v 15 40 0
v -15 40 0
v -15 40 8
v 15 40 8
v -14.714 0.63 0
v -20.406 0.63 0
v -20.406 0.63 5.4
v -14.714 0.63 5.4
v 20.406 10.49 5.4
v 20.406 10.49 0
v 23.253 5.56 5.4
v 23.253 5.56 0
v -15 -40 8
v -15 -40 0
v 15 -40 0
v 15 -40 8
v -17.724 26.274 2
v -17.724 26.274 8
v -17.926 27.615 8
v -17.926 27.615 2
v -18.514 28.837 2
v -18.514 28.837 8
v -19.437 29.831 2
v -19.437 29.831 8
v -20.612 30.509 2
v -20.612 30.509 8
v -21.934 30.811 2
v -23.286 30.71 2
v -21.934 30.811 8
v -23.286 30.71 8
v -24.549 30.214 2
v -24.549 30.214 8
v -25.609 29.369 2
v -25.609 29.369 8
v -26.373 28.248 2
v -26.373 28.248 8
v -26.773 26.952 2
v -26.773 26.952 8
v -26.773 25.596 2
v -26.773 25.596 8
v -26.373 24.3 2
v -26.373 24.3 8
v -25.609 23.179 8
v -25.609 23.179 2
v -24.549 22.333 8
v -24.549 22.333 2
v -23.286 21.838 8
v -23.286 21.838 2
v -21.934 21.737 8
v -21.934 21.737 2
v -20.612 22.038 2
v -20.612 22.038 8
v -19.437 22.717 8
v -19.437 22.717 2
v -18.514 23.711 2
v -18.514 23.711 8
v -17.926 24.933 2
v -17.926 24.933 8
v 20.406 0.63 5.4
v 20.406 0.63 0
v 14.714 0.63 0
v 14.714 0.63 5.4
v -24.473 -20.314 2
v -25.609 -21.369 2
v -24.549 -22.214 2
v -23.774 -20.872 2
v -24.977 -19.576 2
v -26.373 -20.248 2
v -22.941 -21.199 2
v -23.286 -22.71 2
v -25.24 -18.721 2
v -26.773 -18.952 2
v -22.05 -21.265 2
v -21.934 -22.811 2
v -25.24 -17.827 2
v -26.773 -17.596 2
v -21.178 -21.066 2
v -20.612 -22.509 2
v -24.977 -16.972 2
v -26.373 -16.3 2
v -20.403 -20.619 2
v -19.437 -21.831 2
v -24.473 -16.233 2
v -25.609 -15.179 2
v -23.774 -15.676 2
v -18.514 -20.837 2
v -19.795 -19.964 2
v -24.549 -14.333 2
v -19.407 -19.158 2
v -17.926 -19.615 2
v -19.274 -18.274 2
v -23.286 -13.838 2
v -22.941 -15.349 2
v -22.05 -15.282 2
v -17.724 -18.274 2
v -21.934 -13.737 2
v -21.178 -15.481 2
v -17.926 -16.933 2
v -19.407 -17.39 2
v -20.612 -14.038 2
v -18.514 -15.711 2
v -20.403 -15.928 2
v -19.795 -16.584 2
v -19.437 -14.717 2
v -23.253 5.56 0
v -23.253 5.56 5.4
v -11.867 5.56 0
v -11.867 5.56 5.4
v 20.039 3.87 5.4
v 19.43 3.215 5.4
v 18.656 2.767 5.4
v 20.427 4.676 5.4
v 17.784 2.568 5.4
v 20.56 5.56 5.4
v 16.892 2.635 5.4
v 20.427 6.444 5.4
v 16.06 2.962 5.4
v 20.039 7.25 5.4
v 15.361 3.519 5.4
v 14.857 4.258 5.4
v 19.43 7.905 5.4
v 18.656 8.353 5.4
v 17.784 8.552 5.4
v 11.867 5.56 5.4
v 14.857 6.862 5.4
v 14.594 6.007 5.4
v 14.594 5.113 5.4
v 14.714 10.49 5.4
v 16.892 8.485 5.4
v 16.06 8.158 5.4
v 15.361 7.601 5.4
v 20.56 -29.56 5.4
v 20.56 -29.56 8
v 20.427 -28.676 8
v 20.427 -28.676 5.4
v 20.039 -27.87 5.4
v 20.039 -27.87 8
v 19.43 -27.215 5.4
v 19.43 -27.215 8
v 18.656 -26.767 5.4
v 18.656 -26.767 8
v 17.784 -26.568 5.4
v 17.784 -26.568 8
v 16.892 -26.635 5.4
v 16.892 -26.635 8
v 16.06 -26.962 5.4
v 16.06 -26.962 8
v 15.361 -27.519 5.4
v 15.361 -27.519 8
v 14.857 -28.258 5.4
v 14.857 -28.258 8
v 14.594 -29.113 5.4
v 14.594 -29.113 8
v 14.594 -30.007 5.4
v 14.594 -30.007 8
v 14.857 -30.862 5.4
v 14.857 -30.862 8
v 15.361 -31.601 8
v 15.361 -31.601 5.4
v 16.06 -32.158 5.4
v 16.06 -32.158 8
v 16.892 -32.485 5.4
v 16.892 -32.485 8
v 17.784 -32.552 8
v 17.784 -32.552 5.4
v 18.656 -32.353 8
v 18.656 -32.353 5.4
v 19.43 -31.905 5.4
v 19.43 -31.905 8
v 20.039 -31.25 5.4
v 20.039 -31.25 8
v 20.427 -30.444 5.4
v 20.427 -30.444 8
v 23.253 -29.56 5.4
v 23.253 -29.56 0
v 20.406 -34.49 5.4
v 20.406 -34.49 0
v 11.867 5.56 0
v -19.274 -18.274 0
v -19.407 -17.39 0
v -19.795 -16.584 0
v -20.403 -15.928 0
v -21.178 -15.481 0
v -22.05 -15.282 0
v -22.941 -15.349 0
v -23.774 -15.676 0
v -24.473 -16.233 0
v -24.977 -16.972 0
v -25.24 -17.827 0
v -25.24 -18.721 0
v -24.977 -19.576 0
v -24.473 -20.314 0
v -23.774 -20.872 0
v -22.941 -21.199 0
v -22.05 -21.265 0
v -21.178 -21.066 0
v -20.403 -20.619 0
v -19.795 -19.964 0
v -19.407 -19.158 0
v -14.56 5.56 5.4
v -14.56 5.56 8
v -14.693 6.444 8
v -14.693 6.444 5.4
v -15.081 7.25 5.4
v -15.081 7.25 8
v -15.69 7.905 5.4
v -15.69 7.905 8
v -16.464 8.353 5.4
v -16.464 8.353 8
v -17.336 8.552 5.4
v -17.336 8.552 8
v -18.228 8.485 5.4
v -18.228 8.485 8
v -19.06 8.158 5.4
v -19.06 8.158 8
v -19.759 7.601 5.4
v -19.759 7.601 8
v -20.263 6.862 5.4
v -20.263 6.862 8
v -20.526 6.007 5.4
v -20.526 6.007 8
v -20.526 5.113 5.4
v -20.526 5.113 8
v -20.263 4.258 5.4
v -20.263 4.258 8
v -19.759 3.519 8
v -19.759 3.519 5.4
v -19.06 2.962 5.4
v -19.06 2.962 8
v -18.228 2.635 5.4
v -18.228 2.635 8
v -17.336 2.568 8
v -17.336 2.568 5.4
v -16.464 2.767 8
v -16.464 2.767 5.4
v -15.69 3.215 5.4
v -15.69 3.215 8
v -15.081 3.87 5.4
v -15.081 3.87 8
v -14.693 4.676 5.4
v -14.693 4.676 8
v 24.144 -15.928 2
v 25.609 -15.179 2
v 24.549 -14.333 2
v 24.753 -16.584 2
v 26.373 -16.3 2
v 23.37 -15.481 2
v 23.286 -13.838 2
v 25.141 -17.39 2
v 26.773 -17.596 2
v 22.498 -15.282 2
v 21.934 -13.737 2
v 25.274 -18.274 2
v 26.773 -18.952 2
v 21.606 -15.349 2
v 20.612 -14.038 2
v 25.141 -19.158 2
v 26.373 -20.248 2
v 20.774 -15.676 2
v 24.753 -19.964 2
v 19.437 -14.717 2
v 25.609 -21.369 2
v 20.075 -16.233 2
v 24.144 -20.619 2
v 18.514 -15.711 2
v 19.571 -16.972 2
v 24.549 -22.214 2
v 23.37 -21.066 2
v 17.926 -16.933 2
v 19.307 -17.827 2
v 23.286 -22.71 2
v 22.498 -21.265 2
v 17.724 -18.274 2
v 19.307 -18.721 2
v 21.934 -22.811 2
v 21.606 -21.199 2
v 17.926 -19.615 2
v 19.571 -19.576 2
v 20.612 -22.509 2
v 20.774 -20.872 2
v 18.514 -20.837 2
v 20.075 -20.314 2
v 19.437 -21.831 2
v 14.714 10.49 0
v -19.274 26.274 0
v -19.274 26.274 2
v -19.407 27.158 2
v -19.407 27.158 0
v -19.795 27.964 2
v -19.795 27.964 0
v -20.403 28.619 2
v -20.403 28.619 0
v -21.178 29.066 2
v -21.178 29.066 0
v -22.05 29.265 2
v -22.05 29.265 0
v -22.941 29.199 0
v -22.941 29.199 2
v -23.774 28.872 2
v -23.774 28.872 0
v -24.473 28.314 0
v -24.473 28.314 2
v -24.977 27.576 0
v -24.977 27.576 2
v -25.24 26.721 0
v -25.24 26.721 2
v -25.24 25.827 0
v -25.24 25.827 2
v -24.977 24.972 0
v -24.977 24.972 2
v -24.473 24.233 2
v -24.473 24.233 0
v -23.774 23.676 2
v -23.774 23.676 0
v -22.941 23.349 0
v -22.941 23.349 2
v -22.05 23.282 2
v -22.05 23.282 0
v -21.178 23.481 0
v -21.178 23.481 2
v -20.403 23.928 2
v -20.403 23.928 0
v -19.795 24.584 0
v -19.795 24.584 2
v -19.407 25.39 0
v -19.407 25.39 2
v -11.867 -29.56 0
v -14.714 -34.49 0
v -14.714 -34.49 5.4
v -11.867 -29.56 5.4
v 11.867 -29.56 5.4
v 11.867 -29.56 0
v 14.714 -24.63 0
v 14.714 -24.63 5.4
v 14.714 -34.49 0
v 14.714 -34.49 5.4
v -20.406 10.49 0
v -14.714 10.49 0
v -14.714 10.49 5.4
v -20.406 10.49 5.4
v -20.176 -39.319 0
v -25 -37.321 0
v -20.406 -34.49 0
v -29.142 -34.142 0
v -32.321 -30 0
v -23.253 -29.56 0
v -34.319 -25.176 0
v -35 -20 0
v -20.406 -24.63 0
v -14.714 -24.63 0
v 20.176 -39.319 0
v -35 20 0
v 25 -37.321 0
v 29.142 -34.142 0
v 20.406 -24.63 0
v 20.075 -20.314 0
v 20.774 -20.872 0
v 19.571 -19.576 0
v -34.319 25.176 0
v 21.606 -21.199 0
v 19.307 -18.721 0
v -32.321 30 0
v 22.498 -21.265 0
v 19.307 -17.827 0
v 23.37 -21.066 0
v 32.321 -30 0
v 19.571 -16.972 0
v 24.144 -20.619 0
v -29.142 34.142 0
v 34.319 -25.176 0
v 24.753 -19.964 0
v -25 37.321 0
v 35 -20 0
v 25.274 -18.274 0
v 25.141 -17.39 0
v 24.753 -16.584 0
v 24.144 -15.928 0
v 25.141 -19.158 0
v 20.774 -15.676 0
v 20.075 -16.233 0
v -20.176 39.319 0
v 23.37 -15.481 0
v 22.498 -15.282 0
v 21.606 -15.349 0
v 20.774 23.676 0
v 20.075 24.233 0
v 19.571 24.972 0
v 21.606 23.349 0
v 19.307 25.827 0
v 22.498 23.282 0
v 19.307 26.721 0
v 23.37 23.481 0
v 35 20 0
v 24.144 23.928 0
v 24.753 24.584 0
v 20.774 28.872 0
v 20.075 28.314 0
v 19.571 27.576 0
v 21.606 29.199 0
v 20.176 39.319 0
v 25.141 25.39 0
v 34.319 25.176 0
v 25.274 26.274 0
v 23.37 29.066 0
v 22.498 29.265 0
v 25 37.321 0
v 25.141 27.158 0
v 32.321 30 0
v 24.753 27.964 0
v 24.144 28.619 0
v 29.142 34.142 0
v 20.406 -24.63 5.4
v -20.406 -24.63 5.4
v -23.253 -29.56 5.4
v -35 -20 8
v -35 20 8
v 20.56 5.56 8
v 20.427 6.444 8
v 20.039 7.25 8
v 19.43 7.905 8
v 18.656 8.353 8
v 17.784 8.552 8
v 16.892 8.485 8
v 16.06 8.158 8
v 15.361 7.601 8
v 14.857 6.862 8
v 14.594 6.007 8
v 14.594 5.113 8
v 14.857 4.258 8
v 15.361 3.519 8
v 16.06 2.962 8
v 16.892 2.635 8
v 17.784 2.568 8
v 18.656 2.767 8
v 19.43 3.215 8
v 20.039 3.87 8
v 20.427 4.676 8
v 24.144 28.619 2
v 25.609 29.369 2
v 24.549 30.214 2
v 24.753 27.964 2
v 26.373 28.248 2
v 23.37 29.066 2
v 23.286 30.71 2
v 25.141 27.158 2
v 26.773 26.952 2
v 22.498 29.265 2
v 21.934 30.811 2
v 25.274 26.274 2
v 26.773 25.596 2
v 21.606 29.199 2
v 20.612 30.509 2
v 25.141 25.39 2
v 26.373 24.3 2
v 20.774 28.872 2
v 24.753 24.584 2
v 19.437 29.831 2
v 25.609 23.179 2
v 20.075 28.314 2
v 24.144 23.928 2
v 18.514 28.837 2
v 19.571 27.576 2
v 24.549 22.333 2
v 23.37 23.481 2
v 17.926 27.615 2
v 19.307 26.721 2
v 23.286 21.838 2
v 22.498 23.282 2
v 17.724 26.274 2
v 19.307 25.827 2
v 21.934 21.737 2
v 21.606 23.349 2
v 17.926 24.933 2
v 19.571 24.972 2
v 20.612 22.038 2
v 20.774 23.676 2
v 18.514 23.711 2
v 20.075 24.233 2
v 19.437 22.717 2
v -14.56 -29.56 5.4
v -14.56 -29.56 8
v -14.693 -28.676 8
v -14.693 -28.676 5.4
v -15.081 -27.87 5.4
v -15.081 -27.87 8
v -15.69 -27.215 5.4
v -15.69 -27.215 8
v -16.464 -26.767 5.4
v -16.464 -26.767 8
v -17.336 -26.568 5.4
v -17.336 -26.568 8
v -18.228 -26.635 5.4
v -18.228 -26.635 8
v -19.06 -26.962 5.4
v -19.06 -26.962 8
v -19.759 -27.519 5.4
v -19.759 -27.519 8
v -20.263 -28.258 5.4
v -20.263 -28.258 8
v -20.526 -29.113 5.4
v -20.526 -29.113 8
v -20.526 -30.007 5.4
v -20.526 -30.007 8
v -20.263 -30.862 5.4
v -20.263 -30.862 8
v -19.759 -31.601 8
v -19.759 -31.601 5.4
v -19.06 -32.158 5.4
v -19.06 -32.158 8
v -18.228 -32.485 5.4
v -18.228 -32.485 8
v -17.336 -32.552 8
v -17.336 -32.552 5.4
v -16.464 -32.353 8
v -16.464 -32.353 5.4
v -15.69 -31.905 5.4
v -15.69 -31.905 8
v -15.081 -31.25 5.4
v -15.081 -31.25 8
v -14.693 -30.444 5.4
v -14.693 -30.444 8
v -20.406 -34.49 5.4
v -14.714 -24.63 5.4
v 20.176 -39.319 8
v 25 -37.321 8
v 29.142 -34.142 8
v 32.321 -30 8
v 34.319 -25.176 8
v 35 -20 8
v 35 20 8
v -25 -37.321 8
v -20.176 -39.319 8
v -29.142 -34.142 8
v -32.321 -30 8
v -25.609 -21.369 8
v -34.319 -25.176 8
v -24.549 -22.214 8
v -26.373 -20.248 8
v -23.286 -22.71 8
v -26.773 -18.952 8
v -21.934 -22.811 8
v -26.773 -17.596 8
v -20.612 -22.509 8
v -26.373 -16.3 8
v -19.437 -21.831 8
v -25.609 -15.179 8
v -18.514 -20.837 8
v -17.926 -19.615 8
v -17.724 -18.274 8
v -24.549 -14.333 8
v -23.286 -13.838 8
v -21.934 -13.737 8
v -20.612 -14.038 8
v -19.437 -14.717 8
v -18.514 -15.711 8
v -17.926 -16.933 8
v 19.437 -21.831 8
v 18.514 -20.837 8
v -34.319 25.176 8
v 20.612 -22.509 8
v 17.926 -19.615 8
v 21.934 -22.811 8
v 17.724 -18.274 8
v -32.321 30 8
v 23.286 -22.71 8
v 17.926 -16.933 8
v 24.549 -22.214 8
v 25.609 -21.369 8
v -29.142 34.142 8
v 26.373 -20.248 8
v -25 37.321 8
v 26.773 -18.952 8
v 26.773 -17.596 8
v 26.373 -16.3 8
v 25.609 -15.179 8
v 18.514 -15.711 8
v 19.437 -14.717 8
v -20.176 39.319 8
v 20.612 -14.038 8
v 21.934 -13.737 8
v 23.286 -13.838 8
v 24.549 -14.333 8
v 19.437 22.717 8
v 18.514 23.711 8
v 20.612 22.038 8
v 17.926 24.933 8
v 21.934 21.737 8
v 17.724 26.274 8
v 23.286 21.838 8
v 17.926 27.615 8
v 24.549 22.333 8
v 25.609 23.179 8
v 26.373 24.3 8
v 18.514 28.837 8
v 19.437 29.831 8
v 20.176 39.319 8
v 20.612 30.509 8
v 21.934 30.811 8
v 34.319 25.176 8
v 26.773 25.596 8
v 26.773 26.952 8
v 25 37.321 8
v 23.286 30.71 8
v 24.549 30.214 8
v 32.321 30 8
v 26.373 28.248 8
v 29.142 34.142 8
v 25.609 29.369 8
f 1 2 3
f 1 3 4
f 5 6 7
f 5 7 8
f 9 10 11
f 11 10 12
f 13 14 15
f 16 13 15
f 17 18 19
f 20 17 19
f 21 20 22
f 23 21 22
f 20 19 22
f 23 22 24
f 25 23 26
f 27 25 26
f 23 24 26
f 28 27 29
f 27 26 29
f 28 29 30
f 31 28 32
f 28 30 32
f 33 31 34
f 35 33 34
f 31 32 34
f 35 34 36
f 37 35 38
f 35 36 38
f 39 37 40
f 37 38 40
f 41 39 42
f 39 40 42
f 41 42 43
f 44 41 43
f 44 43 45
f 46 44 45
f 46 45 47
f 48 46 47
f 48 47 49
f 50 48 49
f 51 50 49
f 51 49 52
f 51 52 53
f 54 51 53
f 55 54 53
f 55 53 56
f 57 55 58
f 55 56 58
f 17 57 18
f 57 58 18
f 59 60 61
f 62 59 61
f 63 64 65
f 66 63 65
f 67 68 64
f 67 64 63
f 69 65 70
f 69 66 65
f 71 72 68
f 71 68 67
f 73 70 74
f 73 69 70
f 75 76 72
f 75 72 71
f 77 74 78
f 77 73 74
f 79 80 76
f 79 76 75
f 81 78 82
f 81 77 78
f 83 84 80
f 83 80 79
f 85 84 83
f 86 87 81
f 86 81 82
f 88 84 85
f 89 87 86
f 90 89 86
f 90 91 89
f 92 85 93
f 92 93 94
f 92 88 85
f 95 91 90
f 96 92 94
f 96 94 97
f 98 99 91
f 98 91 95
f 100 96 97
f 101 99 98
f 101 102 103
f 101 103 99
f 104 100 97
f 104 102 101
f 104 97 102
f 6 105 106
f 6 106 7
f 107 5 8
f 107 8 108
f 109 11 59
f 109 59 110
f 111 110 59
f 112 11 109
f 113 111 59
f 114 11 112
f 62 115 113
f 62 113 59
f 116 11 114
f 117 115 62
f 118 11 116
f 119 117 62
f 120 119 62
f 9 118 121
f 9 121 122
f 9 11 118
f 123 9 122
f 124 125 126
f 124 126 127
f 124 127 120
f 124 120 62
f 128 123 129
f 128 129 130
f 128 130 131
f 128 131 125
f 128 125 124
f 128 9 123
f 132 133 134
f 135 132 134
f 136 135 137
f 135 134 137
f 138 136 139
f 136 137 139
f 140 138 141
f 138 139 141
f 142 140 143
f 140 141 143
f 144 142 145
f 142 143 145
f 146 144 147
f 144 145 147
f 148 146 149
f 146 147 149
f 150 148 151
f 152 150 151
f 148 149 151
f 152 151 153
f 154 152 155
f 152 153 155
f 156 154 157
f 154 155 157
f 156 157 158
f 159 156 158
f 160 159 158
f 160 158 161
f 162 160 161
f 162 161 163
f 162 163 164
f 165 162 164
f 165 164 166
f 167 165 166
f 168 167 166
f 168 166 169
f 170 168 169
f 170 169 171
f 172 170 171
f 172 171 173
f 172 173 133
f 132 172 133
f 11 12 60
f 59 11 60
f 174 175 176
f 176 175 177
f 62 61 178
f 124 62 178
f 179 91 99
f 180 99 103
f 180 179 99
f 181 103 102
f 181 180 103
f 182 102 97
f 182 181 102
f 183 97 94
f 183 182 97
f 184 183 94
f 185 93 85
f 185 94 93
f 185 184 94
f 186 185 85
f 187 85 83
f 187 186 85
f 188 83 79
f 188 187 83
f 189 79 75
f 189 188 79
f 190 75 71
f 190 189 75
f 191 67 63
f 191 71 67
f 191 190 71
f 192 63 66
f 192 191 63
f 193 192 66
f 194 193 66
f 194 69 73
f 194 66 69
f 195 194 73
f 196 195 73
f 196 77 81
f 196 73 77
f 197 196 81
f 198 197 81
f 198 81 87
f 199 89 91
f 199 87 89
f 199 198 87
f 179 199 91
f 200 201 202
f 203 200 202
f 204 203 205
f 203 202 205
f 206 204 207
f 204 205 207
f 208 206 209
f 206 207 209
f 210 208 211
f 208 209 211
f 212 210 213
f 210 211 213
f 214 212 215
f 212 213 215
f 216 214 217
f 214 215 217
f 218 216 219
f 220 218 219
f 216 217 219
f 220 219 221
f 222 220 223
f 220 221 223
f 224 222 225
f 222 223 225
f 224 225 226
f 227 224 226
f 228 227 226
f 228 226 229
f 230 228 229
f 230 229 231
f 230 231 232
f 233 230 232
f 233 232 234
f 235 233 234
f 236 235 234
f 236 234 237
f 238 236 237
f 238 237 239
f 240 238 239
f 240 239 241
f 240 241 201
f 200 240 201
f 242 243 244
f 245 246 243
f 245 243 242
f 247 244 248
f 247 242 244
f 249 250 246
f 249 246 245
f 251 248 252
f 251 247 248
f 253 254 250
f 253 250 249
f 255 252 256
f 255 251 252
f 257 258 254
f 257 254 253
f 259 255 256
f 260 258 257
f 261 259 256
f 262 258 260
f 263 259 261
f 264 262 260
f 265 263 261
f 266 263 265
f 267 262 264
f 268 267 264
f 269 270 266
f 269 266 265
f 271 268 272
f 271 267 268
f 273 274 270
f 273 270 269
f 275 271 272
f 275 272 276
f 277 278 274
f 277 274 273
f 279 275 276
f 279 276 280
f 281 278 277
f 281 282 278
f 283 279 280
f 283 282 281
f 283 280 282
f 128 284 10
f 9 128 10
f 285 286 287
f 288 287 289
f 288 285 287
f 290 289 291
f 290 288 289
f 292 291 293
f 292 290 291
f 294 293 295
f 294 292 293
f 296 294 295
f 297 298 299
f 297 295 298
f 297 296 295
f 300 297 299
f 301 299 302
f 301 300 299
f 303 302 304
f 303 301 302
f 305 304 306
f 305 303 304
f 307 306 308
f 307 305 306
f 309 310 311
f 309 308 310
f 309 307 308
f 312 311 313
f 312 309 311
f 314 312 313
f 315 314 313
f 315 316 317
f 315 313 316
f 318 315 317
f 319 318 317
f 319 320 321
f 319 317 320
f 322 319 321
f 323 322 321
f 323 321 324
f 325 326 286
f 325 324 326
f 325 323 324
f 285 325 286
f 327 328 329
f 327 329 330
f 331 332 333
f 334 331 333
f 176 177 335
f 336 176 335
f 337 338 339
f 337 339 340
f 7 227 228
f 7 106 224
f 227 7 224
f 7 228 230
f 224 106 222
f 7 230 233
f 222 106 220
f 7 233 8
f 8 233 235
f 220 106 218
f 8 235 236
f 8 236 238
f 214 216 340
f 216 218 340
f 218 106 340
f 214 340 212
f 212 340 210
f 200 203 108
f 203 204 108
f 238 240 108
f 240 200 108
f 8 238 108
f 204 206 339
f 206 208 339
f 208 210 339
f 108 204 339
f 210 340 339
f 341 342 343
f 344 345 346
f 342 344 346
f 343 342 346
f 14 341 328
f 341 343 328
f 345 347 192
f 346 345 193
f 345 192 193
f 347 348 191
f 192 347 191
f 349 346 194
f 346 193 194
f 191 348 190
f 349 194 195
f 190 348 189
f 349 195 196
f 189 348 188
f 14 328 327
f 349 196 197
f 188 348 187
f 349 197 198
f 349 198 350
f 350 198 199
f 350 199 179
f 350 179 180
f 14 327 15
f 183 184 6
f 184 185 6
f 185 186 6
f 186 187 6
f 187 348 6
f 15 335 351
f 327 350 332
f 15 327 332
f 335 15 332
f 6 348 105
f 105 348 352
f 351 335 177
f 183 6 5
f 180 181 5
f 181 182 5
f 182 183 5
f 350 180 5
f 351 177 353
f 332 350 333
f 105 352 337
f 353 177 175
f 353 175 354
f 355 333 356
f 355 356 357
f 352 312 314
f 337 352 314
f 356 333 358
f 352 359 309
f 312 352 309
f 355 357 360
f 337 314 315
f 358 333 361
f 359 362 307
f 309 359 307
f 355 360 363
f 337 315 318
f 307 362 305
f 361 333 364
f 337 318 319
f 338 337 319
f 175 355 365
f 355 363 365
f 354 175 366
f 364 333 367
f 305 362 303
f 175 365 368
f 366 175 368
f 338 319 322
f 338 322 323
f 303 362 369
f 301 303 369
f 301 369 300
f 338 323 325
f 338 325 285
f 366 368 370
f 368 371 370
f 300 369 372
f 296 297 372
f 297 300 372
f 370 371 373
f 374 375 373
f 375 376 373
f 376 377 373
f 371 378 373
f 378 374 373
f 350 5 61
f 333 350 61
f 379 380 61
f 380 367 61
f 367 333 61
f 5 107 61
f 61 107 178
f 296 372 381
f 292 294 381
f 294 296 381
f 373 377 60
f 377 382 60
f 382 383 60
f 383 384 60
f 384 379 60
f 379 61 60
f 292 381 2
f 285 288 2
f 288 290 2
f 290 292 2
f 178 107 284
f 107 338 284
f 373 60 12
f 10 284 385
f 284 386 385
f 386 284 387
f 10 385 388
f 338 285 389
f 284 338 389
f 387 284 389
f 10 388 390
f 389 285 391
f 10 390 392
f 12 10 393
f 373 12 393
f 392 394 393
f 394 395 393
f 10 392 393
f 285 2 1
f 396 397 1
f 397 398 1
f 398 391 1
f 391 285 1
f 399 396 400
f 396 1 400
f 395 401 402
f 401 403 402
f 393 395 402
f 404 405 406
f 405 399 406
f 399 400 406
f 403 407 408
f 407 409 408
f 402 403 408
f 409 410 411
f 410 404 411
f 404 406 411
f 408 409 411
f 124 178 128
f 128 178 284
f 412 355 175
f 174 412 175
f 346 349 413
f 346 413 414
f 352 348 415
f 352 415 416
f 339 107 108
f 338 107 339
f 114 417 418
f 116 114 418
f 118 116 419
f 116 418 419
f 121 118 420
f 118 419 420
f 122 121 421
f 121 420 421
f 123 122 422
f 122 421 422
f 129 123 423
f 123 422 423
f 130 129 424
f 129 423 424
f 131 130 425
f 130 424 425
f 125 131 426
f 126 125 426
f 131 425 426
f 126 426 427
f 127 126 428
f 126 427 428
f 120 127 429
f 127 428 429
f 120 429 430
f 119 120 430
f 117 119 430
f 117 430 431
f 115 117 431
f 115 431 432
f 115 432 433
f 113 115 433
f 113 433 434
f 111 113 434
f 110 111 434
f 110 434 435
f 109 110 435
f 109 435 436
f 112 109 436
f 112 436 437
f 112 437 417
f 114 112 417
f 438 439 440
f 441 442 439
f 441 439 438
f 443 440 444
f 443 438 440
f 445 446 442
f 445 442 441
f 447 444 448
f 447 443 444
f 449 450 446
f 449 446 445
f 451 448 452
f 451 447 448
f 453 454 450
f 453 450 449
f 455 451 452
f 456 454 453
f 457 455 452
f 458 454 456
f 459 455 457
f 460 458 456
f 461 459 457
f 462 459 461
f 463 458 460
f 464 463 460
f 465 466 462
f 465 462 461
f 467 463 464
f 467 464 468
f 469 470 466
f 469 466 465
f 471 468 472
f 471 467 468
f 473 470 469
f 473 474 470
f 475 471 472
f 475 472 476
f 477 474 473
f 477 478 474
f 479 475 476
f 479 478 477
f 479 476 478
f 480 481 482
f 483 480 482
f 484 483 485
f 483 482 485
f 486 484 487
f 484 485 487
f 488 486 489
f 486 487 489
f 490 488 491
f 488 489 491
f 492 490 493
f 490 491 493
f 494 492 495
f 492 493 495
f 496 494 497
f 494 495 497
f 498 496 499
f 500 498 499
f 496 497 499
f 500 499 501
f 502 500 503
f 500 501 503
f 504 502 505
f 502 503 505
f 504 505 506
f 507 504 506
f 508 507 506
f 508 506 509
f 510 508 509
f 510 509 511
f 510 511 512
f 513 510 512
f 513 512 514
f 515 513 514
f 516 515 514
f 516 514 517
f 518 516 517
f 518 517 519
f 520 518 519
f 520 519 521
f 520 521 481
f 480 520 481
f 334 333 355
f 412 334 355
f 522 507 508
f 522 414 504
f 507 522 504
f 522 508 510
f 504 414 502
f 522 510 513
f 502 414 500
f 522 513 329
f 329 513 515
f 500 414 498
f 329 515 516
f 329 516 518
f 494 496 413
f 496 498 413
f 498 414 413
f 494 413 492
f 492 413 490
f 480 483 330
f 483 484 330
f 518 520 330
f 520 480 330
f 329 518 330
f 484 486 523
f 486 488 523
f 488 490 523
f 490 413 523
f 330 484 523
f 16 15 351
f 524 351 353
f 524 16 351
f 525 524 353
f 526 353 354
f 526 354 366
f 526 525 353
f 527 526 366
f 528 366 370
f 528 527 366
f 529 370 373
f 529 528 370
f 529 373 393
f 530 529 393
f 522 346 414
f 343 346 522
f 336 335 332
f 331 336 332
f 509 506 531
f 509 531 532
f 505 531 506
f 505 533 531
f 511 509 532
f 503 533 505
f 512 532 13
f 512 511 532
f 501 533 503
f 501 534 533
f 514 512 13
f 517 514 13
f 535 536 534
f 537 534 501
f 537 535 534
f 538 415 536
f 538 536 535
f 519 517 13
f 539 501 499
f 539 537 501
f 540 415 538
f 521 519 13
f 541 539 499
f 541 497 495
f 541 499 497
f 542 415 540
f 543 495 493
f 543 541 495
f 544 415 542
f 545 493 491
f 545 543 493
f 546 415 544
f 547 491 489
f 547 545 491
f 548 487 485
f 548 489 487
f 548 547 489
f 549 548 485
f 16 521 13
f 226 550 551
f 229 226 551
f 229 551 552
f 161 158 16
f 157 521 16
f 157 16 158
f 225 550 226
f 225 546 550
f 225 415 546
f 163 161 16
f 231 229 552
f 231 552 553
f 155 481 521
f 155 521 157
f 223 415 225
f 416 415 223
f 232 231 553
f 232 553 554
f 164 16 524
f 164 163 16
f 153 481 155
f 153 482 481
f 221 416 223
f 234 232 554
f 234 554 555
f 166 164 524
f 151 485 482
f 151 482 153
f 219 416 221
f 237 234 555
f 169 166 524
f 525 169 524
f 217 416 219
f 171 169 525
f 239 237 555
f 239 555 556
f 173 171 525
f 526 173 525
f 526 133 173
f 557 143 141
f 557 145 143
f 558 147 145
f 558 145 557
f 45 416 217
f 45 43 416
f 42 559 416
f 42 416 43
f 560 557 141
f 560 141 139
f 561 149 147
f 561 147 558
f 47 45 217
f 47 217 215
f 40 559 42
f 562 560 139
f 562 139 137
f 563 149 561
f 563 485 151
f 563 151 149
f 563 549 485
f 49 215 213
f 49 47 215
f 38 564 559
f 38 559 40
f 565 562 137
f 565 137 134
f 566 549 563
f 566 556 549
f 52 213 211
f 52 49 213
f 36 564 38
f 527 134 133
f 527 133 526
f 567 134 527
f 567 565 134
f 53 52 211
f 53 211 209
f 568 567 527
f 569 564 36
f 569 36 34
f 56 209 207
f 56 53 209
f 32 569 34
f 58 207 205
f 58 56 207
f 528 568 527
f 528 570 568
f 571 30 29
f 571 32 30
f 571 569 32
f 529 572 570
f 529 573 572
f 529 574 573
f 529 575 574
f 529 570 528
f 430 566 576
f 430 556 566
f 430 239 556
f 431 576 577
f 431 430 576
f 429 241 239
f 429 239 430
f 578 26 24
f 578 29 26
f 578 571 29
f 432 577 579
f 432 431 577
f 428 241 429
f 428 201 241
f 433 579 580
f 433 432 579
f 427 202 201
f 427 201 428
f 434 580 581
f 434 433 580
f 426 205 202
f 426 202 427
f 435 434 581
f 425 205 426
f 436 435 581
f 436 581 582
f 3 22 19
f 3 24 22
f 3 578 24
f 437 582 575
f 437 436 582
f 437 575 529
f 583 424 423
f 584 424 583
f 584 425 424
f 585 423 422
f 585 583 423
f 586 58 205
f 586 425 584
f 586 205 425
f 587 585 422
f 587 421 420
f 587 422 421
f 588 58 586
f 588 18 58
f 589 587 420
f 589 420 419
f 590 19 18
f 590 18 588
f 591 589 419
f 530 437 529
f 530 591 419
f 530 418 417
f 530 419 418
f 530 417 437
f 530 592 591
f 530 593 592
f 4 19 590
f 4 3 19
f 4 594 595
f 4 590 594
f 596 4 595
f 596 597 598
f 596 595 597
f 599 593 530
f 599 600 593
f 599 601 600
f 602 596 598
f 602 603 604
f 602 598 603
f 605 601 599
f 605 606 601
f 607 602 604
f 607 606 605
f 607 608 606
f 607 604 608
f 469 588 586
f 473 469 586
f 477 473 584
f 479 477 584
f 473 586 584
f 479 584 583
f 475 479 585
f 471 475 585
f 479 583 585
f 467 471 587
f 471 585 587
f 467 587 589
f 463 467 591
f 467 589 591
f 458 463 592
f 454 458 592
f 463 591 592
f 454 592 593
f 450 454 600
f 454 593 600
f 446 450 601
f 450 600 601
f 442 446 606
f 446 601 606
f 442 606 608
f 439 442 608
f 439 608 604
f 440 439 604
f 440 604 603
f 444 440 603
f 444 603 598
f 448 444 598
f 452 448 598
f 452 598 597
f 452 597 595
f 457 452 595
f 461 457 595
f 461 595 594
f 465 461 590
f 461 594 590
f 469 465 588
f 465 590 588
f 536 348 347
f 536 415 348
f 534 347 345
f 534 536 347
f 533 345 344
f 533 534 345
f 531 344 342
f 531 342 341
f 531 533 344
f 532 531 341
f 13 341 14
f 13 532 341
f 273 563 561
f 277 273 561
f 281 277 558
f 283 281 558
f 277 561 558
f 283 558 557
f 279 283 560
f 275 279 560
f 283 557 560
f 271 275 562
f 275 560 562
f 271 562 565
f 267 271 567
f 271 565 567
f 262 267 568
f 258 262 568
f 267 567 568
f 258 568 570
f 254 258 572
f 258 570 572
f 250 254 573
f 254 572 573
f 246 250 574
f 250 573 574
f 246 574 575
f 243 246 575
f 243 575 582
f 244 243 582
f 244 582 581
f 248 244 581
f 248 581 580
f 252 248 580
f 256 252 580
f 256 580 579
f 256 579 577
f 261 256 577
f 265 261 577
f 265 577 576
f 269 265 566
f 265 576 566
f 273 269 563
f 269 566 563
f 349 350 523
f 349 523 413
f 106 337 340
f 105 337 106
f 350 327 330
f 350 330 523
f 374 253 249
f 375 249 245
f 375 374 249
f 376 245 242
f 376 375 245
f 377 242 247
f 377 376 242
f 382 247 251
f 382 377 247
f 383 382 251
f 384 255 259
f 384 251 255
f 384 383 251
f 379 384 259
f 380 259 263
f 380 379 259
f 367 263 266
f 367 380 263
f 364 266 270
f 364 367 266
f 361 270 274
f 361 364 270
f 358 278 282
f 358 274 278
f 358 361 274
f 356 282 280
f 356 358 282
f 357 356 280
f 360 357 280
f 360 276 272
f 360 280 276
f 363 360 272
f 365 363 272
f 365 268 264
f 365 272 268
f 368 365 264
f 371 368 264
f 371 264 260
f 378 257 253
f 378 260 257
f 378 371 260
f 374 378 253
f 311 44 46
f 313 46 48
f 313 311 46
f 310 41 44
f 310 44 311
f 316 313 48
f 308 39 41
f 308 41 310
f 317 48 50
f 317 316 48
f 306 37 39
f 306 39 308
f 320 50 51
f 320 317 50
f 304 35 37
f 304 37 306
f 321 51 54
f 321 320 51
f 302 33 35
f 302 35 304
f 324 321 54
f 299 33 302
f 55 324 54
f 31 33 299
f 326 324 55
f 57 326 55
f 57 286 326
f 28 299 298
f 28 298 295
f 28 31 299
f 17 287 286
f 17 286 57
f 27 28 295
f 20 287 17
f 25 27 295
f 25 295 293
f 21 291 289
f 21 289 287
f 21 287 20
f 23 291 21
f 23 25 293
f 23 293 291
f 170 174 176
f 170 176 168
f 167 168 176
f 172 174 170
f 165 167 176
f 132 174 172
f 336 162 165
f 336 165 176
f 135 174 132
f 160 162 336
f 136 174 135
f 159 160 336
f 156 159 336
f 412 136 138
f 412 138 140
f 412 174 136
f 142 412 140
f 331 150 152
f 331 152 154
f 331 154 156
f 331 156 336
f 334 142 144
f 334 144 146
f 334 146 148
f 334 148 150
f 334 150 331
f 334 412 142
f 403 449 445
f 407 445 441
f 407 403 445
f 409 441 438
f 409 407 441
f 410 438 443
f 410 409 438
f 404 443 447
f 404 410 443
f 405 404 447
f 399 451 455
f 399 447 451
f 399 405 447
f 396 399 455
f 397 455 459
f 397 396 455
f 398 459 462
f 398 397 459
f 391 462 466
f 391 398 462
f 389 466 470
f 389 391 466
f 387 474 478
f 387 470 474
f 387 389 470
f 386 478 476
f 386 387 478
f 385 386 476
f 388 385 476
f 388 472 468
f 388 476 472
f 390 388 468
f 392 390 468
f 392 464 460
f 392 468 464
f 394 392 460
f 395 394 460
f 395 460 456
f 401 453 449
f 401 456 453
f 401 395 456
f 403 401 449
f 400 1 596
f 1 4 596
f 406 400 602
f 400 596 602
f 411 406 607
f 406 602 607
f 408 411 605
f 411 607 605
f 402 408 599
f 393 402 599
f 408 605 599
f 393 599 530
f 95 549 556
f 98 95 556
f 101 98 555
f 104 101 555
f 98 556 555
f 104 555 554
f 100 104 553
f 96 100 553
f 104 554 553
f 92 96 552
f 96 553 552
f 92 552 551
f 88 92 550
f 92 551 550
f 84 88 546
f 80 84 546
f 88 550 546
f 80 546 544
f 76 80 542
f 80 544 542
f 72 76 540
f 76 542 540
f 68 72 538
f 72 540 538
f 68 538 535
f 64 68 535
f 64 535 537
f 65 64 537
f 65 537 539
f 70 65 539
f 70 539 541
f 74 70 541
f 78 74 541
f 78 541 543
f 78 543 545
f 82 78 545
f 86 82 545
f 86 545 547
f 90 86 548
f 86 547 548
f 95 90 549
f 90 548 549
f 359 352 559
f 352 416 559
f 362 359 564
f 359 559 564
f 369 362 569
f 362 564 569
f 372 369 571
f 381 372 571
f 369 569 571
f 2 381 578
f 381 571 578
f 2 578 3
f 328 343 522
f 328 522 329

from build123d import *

# Parameters (mm, degrees)
SKETCH_1_W          = 70
SKETCH_1_H          = 80
EXTRUDE_1_DEPTH     = 8
SKETCH_11_R         = 3
CUT_EXTRUDE_4_DEPTH = 15
SKETCH_13_R         = 4.55
CUT_EXTRUDE_6_DEPTH = 6
SKETCH_14_R         = 3
CUT_EXTRUDE_7_DEPTH = 16
CUT_EXTRUDE_8_DEPTH = 5.4
FILLET_1_R          = 20


with BuildPart() as part:
    # 草图1 → 凸台-拉伸1 (new body)
    with BuildSketch(Plane.XY):
        Rectangle(SKETCH_1_W, SKETCH_1_H)
    extrude(amount=EXTRUDE_1_DEPTH)

    # 草图11 → 切除-拉伸4 (cut)
    with BuildSketch(Plane.XY):
        with Locations((-22.273863607, 26.273863607)):
            Circle(SKETCH_11_R)
        with Locations((22.273863607, 26.273863607)):
            Circle(SKETCH_11_R)
        with Locations((22.273863607, -18.273863607)):
            Circle(SKETCH_11_R)
        with Locations((-22.273863607, -18.273863607)):
            Circle(SKETCH_11_R)
    extrude(amount=CUT_EXTRUDE_4_DEPTH, mode=Mode.SUBTRACT)

    # 草图13 → 切除-拉伸6 (cut)
    with BuildSketch(Plane.XY.offset(8)):
        with Locations((-22.273863607, 26.273863607)):
            Circle(SKETCH_13_R)
        with Locations((-22.273863607, -18.273863607)):
            Circle(SKETCH_13_R)
        with Locations(Location((22.273863607, -18.273863607, 0), (0, 0, 180))):
            Circle(SKETCH_13_R)
        with Locations(Location((22.273863607, 26.273863607, 0), (0, 0, 180))):
            Circle(SKETCH_13_R)
    extrude(amount=-CUT_EXTRUDE_6_DEPTH, mode=Mode.SUBTRACT)

    # 草图14 → 切除-拉伸7 (cut)
    with BuildSketch(Plane.XY.offset(8)):
        with Locations((-17.56, 5.56)):
            Circle(SKETCH_14_R)
        with Locations((17.56, 5.56)):
            Circle(SKETCH_14_R)
        with Locations((17.56, -29.56)):
            Circle(SKETCH_14_R)
        with Locations((-17.56, -29.56)):
            Circle(SKETCH_14_R)
    extrude(amount=-CUT_EXTRUDE_7_DEPTH, mode=Mode.SUBTRACT)

    # 草图15 → 切除-拉伸8 (cut)
    with BuildSketch(Plane(origin=(0, 0, 0), x_dir=(-1, 0, 0), z_dir=(0, 0, -1))):
        Polygon((-14.713663173, 0.63), (-11.867326346, 5.56), (-14.713663173, 10.49), (-20.406336827, 10.49), (-23.252673654, 5.56), (-20.406336827, 0.63), align=None)
        Polygon((-14.713663173, -34.49), (-11.867326346, -29.56), (-14.713663173, -24.63), (-20.406336827, -24.63), (-23.252673654, -29.56), (-20.406336827, -34.49), align=None)
        Polygon((20.406336827, -34.49), (14.713663173, -34.49), (11.867326346, -29.56), (14.713663173, -24.63), (20.406336827, -24.63), (23.252673654, -29.56), align=None)
        Polygon((20.406336827, 0.63), (14.713663173, 0.63), (11.867326346, 5.56), (14.713663173, 10.49), (20.406336827, 10.49), (23.252673654, 5.56), align=None)
    extrude(amount=-CUT_EXTRUDE_8_DEPTH, mode=Mode.SUBTRACT)

    # 圆角1
    fillet_1_edges = [part.edges().sort_by_distance(p)[0] for p in [
        (-35, 40, 4),
        (35, 40, 4),
        (35, -40, 4),
        (-35, -40, 4),
    ]]
    fillet(fillet_1_edges, radius=FILLET_1_R)


solid = part.part
